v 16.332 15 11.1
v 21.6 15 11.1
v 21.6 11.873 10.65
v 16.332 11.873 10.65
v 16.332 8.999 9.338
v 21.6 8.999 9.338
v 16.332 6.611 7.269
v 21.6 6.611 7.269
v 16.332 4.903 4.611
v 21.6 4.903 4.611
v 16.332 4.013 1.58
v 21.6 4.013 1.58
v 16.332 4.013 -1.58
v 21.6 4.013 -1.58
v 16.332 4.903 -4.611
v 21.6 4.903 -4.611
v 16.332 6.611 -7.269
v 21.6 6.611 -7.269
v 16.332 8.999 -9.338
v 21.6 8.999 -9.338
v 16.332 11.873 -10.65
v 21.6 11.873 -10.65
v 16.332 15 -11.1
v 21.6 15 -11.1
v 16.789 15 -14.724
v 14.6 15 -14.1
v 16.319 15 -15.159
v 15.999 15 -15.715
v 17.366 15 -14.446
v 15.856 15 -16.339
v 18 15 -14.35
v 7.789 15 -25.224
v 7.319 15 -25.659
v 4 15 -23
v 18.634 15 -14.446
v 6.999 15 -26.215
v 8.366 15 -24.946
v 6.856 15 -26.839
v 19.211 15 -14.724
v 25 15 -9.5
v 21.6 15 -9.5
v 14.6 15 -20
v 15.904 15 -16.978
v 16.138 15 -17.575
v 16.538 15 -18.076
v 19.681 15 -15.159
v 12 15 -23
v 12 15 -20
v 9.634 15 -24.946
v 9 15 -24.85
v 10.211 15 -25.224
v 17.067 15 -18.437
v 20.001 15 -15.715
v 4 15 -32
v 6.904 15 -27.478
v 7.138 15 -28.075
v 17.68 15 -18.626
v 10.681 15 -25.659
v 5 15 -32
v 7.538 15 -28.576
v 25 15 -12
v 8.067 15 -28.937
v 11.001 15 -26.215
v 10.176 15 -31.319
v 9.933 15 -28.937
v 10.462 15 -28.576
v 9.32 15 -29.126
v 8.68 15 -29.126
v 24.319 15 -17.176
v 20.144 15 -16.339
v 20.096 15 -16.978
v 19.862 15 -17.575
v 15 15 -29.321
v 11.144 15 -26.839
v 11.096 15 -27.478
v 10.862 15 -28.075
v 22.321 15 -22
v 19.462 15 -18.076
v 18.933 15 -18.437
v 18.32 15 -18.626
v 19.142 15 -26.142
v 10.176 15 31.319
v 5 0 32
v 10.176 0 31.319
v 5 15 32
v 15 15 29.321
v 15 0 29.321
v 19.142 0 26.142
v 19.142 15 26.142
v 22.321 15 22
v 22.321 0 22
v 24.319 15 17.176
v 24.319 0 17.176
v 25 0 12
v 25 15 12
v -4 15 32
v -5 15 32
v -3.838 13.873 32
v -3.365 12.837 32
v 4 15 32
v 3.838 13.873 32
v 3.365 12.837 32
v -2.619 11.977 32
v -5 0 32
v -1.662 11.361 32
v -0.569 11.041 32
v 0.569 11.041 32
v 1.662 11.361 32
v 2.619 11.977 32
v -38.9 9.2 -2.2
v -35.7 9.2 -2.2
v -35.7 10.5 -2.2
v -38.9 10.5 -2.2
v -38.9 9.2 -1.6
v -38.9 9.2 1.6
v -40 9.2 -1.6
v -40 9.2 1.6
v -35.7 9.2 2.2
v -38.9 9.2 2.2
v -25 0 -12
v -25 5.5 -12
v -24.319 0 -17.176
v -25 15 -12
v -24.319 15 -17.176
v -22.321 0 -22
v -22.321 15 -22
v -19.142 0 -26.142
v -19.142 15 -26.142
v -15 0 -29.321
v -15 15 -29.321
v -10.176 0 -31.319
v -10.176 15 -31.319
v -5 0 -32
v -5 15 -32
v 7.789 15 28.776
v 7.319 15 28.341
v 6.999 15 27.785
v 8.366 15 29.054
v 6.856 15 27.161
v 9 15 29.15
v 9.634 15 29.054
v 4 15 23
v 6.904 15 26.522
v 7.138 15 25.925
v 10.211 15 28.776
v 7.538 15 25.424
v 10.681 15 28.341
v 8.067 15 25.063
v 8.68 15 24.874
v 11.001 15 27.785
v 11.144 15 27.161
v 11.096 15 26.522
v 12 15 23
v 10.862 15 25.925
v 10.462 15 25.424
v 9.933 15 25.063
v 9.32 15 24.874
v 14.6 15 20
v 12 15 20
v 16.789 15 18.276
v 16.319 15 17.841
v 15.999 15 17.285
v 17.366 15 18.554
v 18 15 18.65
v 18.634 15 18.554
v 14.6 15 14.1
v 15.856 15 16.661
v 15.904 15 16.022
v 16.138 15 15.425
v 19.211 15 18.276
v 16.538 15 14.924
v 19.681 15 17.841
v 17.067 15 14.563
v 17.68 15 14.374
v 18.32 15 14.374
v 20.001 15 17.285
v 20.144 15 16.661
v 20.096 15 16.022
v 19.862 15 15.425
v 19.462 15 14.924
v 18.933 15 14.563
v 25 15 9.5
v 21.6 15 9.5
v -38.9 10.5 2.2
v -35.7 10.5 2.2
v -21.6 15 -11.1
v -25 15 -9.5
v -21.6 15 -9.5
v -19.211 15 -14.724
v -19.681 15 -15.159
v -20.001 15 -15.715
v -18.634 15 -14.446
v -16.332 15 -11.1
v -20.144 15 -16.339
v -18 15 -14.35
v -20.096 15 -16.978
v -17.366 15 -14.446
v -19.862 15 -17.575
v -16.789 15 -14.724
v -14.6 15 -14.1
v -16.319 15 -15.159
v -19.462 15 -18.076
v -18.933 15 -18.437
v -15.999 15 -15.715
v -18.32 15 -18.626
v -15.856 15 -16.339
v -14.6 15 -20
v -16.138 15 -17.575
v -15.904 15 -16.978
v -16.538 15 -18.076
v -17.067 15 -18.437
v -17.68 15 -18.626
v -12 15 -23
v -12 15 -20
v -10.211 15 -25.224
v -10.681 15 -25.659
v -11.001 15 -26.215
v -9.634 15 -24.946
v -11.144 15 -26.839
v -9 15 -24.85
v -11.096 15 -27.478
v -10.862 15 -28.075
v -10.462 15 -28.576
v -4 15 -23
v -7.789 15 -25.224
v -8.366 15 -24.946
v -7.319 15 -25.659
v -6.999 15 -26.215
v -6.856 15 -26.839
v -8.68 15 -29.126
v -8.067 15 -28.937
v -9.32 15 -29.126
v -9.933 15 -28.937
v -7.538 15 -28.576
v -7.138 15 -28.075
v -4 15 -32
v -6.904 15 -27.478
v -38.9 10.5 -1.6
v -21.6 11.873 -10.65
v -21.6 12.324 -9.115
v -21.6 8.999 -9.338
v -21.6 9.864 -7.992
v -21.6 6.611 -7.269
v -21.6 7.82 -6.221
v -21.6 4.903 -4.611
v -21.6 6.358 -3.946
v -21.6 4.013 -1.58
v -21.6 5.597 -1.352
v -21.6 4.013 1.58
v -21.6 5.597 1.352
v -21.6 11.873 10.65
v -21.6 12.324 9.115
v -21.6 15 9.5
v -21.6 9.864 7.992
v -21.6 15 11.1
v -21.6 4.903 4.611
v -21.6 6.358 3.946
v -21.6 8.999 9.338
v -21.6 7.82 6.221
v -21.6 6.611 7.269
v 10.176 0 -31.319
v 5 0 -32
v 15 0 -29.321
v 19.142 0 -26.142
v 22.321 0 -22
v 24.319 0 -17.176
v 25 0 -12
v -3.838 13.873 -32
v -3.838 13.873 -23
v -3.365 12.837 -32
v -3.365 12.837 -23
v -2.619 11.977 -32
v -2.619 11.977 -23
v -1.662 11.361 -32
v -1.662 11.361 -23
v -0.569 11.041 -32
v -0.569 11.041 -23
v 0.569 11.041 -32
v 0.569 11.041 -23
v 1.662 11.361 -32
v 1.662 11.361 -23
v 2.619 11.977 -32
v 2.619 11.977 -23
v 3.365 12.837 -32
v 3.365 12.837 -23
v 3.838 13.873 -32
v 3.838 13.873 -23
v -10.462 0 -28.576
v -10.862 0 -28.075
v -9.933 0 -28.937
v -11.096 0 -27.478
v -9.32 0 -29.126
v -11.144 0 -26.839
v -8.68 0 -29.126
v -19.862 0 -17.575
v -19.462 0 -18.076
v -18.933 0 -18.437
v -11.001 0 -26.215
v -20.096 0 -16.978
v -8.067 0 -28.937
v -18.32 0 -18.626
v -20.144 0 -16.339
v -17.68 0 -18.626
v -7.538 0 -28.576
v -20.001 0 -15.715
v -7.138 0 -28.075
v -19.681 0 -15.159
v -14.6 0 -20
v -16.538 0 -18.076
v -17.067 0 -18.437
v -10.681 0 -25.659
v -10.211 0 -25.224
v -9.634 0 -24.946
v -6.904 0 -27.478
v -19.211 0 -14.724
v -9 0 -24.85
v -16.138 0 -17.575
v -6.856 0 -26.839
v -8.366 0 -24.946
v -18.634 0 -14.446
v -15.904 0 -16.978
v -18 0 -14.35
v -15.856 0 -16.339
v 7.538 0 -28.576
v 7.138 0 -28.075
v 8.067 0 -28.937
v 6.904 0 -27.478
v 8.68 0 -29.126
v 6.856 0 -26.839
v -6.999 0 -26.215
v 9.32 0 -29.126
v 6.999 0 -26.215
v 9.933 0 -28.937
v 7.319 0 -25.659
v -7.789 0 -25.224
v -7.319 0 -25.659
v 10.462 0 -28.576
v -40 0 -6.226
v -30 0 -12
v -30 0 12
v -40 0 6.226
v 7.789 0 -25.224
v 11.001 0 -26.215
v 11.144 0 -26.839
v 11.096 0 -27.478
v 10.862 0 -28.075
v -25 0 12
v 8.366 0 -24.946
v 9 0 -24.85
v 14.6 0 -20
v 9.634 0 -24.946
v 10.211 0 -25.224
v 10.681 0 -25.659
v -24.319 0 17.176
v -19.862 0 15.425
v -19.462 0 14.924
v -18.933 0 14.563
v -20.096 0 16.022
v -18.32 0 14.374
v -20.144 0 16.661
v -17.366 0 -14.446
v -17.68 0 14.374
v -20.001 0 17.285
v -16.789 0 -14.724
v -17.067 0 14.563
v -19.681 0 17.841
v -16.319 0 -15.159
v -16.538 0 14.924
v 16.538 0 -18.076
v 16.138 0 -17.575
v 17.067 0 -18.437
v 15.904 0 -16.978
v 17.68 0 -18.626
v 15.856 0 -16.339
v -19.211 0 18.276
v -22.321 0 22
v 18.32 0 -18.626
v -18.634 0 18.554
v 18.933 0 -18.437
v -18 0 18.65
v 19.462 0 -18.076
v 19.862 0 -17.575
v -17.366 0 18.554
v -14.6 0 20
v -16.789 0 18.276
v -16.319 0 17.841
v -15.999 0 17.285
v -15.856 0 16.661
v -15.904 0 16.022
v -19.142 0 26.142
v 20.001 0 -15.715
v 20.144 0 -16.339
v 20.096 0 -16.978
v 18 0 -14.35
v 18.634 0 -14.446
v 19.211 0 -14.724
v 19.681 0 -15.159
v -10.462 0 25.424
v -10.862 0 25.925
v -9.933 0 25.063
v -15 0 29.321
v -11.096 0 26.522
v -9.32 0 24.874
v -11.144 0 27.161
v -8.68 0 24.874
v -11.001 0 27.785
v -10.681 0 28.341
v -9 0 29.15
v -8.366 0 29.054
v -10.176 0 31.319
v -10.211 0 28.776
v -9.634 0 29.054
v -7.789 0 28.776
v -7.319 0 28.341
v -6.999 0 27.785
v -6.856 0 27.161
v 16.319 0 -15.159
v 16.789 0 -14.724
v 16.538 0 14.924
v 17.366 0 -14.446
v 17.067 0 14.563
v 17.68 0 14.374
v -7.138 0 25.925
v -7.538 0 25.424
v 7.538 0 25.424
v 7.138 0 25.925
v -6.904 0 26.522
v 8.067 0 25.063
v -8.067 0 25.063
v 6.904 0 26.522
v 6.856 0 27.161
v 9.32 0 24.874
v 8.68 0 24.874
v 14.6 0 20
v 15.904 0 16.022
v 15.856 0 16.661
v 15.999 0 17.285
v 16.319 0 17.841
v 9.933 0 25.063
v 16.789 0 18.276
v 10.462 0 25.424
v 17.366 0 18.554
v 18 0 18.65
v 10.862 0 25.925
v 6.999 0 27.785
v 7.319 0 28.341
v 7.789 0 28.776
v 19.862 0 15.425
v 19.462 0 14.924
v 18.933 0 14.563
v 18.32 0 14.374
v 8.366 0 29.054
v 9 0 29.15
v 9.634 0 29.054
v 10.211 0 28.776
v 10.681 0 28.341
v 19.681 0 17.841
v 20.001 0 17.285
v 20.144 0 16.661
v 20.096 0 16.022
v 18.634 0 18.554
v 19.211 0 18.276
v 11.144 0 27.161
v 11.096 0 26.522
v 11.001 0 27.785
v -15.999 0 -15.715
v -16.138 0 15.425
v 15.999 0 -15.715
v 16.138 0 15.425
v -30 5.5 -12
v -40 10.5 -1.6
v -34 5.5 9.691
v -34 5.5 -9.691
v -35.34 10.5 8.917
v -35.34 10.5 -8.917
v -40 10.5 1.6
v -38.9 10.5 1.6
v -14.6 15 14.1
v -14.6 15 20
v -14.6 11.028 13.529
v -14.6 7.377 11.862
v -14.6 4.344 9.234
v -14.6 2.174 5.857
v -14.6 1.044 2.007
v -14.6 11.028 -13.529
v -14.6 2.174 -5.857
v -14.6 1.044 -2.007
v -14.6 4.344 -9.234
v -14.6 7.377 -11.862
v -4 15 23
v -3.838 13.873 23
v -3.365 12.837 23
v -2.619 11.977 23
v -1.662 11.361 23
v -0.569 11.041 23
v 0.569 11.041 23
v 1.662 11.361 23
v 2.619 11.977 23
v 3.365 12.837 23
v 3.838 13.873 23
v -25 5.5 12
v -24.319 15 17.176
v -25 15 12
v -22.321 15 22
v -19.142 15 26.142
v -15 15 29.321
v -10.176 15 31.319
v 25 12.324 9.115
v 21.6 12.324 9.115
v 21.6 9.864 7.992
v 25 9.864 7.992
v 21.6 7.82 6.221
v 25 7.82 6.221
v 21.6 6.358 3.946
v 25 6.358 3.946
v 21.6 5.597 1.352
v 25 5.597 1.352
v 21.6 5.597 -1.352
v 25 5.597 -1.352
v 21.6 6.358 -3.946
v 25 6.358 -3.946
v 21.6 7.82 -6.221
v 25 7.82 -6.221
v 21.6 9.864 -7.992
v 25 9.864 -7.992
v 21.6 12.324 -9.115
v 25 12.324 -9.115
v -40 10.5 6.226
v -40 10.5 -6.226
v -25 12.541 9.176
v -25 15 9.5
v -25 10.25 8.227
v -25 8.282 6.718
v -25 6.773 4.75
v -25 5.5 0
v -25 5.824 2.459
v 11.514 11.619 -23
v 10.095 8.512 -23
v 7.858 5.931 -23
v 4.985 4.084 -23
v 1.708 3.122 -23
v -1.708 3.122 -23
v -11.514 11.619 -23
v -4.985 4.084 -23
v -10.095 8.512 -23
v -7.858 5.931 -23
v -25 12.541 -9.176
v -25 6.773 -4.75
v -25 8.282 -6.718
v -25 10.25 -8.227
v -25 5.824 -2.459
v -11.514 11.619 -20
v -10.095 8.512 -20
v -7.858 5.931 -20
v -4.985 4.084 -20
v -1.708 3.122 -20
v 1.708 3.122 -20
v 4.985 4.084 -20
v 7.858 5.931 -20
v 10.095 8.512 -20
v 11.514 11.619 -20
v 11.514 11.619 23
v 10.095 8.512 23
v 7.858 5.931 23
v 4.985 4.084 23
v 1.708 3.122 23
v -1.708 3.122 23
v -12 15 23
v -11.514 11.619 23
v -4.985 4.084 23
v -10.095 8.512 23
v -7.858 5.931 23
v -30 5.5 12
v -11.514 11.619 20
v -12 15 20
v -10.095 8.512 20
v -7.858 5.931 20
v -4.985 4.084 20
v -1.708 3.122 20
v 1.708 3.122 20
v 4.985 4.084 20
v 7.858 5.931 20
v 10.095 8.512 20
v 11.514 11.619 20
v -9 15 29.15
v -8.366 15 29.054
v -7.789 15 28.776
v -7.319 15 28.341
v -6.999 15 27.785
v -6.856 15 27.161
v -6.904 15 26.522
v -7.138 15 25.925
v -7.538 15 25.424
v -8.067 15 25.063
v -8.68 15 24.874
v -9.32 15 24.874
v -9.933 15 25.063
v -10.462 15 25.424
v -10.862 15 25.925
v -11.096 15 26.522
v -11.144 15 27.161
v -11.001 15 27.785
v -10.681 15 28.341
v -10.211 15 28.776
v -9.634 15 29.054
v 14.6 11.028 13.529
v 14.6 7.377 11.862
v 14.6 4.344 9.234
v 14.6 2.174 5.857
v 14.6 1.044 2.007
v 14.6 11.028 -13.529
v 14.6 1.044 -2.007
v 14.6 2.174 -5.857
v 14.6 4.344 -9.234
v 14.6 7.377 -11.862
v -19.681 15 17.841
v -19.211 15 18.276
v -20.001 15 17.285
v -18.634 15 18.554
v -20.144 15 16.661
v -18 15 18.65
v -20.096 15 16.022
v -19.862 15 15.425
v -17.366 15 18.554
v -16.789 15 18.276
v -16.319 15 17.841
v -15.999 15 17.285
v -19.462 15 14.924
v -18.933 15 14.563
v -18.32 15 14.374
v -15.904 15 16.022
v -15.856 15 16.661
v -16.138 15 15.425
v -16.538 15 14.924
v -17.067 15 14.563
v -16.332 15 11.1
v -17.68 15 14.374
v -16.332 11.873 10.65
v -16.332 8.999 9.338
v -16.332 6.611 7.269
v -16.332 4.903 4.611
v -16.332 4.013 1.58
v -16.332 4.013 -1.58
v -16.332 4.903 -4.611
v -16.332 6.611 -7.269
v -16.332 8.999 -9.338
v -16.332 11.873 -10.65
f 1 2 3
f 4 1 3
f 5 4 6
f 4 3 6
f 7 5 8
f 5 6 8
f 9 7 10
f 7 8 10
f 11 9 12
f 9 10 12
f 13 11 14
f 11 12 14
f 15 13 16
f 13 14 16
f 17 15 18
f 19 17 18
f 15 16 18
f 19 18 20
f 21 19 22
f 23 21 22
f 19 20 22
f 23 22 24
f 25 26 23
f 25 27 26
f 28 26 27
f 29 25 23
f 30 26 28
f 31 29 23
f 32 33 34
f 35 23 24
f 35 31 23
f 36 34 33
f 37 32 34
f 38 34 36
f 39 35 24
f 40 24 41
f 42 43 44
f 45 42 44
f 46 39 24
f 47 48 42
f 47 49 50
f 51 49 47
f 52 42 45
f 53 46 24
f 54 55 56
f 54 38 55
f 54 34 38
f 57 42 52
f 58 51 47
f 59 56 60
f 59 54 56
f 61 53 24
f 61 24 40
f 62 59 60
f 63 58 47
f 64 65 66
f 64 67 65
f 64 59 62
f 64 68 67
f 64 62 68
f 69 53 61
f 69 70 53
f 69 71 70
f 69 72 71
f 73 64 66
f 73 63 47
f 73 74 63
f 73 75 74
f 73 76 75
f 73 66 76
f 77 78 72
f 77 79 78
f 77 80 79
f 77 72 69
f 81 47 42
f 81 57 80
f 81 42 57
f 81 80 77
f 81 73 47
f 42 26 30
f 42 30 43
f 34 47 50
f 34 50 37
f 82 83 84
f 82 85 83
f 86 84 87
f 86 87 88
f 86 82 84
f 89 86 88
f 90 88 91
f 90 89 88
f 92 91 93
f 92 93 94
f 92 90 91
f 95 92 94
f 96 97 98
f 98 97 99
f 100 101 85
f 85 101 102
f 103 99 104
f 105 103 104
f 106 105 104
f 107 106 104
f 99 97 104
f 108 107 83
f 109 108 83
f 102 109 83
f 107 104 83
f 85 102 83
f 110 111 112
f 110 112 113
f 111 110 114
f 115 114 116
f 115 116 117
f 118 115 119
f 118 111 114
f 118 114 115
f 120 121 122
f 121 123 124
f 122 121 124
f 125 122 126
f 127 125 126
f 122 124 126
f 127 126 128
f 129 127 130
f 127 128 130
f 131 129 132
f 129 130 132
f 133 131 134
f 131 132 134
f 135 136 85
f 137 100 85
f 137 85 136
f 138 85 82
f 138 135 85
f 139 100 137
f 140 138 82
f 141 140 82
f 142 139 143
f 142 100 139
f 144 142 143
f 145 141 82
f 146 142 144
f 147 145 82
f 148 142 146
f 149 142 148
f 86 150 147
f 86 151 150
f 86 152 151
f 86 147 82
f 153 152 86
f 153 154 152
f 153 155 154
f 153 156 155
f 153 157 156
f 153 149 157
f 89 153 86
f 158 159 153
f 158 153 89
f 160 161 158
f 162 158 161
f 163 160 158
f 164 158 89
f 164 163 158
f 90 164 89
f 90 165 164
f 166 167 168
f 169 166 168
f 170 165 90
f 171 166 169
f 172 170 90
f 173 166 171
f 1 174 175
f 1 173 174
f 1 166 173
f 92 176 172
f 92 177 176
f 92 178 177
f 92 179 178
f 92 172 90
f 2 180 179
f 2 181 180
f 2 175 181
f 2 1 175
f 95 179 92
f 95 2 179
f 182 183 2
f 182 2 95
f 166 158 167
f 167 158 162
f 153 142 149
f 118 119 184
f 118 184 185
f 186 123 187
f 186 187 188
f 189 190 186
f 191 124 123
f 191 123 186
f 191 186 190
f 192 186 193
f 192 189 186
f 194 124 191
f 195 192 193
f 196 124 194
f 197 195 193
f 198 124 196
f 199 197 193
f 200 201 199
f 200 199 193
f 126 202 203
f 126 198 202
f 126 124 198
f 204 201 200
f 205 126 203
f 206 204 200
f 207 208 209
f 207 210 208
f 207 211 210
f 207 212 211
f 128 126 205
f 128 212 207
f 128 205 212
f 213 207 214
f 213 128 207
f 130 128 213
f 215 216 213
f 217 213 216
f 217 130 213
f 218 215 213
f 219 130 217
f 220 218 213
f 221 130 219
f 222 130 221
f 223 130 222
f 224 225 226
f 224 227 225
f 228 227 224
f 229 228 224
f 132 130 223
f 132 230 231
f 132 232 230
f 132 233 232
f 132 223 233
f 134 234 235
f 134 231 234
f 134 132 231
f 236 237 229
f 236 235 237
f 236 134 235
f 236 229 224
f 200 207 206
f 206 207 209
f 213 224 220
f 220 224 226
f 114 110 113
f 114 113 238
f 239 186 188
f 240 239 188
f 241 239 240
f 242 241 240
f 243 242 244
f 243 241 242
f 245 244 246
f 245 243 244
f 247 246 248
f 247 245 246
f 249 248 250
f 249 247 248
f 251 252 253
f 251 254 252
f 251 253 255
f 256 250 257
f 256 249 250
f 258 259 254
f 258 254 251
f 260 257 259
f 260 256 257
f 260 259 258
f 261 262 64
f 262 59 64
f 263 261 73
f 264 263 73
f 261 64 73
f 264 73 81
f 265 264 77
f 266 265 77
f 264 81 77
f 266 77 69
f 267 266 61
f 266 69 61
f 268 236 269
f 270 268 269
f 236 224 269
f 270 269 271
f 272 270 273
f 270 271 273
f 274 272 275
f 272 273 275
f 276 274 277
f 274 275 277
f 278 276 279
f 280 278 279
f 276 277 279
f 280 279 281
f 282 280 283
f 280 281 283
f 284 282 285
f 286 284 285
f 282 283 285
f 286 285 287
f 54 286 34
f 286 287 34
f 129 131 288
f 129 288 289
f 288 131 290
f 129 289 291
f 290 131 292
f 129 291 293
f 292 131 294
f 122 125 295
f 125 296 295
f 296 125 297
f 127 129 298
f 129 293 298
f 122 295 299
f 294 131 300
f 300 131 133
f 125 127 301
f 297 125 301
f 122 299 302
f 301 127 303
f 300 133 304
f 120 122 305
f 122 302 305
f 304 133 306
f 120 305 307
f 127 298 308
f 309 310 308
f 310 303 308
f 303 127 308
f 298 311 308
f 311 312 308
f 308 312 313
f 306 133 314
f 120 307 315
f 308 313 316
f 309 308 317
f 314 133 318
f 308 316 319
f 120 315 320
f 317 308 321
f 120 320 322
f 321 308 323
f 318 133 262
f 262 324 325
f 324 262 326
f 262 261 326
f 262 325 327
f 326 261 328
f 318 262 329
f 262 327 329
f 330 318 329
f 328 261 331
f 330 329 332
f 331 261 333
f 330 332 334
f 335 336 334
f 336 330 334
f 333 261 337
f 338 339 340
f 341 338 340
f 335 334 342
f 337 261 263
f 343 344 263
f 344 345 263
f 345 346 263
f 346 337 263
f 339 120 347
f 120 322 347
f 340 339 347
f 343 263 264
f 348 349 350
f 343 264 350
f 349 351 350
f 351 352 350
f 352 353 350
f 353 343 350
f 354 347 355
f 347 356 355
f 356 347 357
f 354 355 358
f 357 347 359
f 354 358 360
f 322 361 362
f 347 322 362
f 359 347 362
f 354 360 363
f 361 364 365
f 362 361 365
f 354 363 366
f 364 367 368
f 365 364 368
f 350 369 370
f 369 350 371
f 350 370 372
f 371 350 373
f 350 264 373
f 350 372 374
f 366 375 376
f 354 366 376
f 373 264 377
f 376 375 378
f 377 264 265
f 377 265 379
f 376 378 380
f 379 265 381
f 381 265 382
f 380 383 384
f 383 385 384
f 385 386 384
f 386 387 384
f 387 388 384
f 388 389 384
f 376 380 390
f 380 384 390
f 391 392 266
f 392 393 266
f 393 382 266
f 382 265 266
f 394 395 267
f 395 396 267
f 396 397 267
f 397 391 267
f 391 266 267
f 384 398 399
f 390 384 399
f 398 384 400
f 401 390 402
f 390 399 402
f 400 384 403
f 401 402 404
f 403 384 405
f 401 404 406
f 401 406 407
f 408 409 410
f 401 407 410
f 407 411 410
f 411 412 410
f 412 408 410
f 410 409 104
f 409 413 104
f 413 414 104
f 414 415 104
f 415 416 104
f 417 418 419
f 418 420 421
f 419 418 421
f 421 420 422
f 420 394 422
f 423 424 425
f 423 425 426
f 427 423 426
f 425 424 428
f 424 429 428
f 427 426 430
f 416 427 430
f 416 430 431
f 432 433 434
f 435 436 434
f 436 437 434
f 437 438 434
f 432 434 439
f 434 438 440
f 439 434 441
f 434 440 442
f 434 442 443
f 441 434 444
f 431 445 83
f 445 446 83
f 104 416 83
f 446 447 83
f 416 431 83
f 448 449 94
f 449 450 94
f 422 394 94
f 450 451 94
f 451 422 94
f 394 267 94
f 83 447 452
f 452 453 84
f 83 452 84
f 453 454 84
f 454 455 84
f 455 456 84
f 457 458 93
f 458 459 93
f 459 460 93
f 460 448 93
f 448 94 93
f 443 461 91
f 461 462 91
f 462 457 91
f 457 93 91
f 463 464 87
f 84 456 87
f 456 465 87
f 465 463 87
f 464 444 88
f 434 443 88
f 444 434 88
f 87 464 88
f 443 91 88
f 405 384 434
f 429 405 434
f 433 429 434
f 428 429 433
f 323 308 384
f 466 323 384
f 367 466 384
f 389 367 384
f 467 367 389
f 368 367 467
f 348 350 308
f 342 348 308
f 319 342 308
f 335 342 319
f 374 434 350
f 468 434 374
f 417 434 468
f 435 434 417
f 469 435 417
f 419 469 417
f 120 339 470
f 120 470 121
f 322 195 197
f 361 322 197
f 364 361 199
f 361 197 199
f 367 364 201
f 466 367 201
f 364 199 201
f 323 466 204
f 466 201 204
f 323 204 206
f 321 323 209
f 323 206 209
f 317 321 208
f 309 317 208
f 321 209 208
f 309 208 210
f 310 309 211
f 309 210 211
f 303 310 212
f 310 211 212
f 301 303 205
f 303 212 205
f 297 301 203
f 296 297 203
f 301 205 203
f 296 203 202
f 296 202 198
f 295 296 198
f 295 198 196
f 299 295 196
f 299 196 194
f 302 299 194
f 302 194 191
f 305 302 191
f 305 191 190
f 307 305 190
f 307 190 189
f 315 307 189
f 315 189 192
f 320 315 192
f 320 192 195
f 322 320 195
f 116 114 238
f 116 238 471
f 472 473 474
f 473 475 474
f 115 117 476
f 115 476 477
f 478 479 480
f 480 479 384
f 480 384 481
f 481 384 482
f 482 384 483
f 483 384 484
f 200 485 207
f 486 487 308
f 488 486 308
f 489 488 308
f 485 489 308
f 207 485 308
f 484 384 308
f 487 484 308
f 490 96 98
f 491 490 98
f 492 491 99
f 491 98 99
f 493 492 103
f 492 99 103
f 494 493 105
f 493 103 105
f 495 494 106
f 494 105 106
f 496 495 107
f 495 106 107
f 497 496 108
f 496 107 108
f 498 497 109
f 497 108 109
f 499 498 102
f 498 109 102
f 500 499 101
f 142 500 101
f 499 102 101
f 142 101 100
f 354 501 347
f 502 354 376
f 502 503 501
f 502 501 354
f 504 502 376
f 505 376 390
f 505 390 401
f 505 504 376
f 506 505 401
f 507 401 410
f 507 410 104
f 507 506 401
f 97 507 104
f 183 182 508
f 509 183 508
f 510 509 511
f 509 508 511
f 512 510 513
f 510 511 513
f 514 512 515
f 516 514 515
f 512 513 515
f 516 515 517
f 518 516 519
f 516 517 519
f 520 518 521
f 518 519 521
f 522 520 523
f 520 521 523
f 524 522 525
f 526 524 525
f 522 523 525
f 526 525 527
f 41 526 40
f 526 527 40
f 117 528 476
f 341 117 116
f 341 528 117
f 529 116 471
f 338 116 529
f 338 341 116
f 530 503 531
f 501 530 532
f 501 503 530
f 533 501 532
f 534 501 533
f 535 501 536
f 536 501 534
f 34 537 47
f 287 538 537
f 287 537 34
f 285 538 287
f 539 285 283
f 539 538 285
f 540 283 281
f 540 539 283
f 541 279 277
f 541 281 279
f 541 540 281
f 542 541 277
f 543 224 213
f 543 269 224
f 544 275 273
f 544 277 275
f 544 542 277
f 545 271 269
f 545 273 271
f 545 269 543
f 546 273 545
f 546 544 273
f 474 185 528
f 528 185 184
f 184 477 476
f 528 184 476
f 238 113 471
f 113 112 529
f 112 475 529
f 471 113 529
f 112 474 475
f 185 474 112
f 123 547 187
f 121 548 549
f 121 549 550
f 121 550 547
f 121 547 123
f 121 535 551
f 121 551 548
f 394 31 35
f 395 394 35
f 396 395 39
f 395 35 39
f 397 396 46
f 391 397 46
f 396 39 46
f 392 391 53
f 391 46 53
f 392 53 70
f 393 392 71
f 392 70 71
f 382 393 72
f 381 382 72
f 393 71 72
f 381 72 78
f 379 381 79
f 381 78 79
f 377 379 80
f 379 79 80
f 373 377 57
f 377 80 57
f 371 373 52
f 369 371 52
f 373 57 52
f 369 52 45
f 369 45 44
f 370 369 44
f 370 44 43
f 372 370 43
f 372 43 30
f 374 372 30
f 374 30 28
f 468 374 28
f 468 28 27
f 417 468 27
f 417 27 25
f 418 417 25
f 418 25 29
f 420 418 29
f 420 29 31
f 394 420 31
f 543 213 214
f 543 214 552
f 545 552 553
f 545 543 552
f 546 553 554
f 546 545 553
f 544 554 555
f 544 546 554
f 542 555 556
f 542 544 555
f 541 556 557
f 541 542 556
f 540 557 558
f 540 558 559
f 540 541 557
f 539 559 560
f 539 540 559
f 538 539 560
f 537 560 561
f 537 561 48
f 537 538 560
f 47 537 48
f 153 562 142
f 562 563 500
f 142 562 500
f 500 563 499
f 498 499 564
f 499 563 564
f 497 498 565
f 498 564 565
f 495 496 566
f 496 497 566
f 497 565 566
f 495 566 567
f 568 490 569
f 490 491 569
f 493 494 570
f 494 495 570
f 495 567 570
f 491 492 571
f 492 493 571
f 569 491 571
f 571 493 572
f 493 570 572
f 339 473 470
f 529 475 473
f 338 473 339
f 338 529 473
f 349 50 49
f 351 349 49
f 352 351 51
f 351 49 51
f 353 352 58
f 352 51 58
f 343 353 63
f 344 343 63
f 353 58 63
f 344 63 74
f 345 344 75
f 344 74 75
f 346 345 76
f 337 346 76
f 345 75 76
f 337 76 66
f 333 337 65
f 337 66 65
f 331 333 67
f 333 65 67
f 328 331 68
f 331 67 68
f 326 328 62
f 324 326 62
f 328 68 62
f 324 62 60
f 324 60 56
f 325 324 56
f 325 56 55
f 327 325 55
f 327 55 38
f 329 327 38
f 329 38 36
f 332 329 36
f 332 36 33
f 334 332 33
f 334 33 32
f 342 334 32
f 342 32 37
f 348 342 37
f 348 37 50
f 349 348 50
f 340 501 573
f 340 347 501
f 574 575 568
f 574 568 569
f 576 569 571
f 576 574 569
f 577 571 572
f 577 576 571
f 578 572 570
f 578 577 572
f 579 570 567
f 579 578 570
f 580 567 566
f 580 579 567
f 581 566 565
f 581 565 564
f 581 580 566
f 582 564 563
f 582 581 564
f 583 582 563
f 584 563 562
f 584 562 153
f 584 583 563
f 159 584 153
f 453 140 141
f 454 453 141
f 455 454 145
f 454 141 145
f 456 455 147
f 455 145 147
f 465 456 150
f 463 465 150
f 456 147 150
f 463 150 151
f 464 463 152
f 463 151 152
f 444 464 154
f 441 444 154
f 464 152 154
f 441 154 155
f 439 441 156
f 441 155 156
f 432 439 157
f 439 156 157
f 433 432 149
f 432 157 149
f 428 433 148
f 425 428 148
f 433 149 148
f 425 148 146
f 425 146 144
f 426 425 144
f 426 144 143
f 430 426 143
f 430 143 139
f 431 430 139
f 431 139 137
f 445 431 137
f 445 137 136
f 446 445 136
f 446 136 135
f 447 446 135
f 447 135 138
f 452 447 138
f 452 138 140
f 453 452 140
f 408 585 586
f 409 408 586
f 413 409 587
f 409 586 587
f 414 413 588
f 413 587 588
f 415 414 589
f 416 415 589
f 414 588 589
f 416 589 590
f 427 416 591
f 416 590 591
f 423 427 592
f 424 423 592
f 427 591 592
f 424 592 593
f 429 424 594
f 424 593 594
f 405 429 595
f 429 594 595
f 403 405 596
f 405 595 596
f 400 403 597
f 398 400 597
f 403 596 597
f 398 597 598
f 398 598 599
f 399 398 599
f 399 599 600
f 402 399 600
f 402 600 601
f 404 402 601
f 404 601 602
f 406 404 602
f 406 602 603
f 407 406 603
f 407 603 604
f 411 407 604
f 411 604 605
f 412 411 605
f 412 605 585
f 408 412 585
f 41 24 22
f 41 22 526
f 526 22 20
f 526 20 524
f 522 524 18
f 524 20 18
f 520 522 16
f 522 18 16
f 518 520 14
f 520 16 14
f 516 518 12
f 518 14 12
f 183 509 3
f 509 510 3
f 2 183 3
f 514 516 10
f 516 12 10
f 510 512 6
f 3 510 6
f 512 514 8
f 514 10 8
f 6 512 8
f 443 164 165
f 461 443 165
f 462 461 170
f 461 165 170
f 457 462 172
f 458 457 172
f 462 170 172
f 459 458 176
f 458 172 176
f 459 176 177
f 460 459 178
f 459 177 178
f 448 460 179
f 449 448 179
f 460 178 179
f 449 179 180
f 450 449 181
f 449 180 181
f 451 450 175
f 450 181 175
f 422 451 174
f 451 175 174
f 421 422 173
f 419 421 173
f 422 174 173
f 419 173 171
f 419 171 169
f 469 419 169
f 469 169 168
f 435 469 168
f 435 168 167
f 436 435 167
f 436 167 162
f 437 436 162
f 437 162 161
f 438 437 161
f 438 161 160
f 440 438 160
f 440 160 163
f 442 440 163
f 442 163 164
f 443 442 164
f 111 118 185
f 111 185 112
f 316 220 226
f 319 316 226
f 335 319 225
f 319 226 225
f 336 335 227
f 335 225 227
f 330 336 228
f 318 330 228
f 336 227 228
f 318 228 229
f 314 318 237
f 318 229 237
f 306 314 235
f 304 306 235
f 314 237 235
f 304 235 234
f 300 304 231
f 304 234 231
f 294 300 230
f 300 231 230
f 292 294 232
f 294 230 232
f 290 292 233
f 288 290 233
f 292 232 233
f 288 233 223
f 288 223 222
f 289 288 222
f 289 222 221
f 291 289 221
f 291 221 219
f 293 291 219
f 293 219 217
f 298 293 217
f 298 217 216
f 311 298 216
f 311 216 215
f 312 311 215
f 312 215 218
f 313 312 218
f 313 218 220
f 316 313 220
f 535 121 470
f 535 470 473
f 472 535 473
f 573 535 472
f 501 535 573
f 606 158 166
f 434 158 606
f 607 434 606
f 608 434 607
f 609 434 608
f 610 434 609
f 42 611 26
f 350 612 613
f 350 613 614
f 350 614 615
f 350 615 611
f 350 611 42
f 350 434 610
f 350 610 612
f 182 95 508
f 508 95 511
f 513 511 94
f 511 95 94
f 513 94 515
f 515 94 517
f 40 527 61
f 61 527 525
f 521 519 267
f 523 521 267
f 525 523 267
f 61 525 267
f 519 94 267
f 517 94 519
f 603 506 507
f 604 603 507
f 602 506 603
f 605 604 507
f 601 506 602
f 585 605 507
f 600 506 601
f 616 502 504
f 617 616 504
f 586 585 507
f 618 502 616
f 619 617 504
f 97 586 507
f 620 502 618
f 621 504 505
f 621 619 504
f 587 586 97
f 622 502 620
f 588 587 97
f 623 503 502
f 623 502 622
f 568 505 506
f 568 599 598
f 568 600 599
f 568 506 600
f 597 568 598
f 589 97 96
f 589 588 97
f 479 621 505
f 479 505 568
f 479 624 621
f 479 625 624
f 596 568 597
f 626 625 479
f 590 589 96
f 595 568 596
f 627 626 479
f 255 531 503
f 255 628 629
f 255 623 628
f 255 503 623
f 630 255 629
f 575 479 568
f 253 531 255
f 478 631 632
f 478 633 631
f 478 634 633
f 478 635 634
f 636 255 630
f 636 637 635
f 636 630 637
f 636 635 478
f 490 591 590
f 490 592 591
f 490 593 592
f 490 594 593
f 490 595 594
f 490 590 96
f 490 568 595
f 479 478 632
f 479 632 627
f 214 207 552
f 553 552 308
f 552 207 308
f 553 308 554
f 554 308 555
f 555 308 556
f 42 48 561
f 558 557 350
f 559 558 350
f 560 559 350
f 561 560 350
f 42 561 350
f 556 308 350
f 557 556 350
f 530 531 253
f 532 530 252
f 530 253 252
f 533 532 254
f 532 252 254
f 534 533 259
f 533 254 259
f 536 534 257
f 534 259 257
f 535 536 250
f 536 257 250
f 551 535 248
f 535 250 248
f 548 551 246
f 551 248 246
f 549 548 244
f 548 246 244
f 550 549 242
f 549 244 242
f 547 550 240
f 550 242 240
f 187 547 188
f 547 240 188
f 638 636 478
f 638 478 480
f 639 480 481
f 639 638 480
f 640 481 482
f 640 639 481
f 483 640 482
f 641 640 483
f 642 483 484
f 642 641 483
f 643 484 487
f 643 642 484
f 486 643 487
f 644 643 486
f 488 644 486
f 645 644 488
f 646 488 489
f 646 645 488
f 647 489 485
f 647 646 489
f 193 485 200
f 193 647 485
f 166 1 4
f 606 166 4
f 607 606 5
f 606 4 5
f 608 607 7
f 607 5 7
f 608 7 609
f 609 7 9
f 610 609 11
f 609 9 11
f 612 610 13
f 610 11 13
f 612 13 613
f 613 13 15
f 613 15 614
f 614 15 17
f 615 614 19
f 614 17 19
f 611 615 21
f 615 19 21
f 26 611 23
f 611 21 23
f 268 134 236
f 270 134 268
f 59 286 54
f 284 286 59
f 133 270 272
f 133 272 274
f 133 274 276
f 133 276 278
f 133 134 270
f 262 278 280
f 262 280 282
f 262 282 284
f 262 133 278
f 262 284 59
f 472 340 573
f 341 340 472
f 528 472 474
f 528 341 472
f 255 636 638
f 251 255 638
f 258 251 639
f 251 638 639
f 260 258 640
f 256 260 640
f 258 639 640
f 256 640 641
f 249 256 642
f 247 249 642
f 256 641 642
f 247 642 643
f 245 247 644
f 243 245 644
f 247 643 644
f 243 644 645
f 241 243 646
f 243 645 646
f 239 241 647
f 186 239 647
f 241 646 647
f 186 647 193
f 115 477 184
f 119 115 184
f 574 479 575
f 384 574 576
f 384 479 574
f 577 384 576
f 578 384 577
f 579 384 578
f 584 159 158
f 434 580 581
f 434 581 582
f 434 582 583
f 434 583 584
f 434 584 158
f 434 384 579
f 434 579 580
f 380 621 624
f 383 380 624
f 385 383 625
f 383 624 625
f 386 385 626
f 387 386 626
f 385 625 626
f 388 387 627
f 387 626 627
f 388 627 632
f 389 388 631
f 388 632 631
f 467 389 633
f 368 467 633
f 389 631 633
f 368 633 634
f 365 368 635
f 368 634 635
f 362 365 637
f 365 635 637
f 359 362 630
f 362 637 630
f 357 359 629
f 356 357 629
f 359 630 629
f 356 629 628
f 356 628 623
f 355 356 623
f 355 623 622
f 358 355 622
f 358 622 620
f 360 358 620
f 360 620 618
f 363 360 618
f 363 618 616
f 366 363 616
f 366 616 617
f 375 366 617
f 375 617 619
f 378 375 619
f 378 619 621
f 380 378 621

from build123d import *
from OCP.BRepFilletAPI import BRepFilletAPI_MakeChamfer

# Parameters (mm, degrees)
SKETCH1_W           = 50
SKETCH1_H           = 64
SKETCH1_W_2         = 29.2
SKETCH1_H_2         = 40
BOSS_EXTRUDE1_DEPTH = 15
SKETCH3_W           = 7
SKETCH3_H           = 11.1
SKETCH4_R           = 9.5
CUT_EXTRUDE2_DEPTH  = 62.229078059
SKETCH5_R           = 4
CUT_EXTRUDE3_DEPTH  = 71.32780389
SKETCH8_R           = 2.15
CUT_EXTRUDE6_DEPTH  = 44.289721644
FILLET1_R           = 20
CHAMFER1_SIZE       = 3
CHAMFER1_SIZE2      = 1.732050808
SKETCH9_W           = 12
SKETCH9_H           = 3
SKETCH10_W          = 24
SKETCH10_H          = 5.5
BOSS_EXTRUDE2_DEPTH = 15
BOSS_EXTRUDE3_START = 9
SKETCH12_W          = 24
SKETCH12_H          = 3.7
BOSS_EXTRUDE3_DEPTH = 6
BOSS_EXTRUDE4_DEPTH = 1.3
CHAMFER2_SIZE2      = 1.339745962
CHAMFER2_SIZE       = 5
CHAMFER3_SIZE       = 10
CHAMFER3_SIZE2      = 5.773502692


with BuildPart() as part:
    # Sketch1 → Boss-Extrude1 (new body)
    with BuildSketch(Plane(origin=(0, 0, 0), x_dir=(1, 0, 0), z_dir=(0, 1, 0))):
        Rectangle(SKETCH1_W, SKETCH1_H)
        Rectangle(SKETCH1_W_2, SKETCH1_H_2, mode=Mode.SUBTRACT)
    extrude(amount=BOSS_EXTRUDE1_DEPTH)

    # Sketch3 → Cut-Revolve1 (revolve, cut)
    with BuildSketch(Plane(origin=(0, 15, 0), x_dir=(1, 0, 0), z_dir=(0, 1, 0))):
        with Locations((18.1, -5.55)):
            Rectangle(SKETCH3_W, SKETCH3_H)
        with Locations((-18.1, -5.55)):
            Rectangle(SKETCH3_W, SKETCH3_H)
    revolve(axis=Axis((14.6, 15, 0), (1, 0, 0)), mode=Mode.SUBTRACT)

    # Sketch4 → Cut-Extrude2 (cut, through all)
    with BuildSketch(Plane(origin=(25, 0, 0), x_dir=(0, 0, -1), z_dir=(1, 0, 0))):
        with Locations((0, 15)):
            Circle(SKETCH4_R)
    extrude(amount=-CUT_EXTRUDE2_DEPTH, mode=Mode.SUBTRACT)

    # Sketch5 → Cut-Extrude3 (cut, through all)
    with BuildSketch(Plane.XY.offset(32)):
        with Locations((0, 15)):
            Circle(SKETCH5_R)
    extrude(amount=-CUT_EXTRUDE3_DEPTH, mode=Mode.SUBTRACT)

    # Sketch8 → Cut-Extrude6 (cut, through all)
    with BuildSketch(Plane(origin=(0, 15, 0), x_dir=(1, 0, 0), z_dir=(0, 1, 0))):
        with Locations(Location((18, 16.5, 0), (0, 0, 270))):
            Circle(SKETCH8_R)
        with Locations(Location((18, -16.5, 0), (0, 0, 270))):
            Circle(SKETCH8_R)
        with Locations(Location((-18, -16.5, 0), (0, 0, 270))):
            Circle(SKETCH8_R)
        with Locations(Location((-18, 16.5, 0), (0, 0, 270))):
            Circle(SKETCH8_R)
        with Locations(Location((9, -27, 0), (0, 0, 270))):
            Circle(SKETCH8_R)
        with Locations(Location((-9, -27, 0), (0, 0, 270))):
            Circle(SKETCH8_R)
        with Locations(Location((-9, 27, 0), (0, 0, 270))):
            Circle(SKETCH8_R)
        with Locations(Location((9, 27, 0), (0, 0, 270))):
            Circle(SKETCH8_R)
    extrude(amount=-CUT_EXTRUDE6_DEPTH, mode=Mode.SUBTRACT)

    # Fillet1
    fillet1_edges = [part.edges().sort_by_distance(p)[0] for p in [
        (-25, 7.5, -32),
        (25, 7.5, -32),
        (25, 7.5, 32),
        (-25, 7.5, 32),
    ]]
    fillet(fillet1_edges, radius=FILLET1_R)

    # Chamfer1: one chamfer whose edges measure the first distance from different faces: ONE call of the kernel's chamfer builder (chamfer() names one face for all edges)
    chamfer1_edges_1 = [part.edges().sort_by_distance(p)[0] for p in [
        (14.6, 3.9, 0),
    ]]
    chamfer1_side_1 = [part.faces().sort_by_distance(p)[0] for p in [
        (14.6, 0.427200187, 0),
    ]]
    chamfer1_edges_2 = [part.edges().sort_by_distance(p)[0] for p in [
        (-14.6, 3.9, 0),
    ]]
    chamfer1_side_2 = [part.faces().sort_by_distance(p)[0] for p in [
        (-14.6, 0.427200187, 0),
    ]]
    chamfer1 = BRepFilletAPI_MakeChamfer(part.part.solid().wrapped)
    for e in chamfer1_edges_1:
        chamfer1.Add(CHAMFER1_SIZE, CHAMFER1_SIZE2, e.wrapped, chamfer1_side_1[0].wrapped)  # the first distance lies on this face
    for e in chamfer1_edges_2:
        chamfer1.Add(CHAMFER1_SIZE, CHAMFER1_SIZE2, e.wrapped, chamfer1_side_2[0].wrapped)  # the first distance lies on this face
    add(Compound.cast(chamfer1.Shape()), mode=Mode.REPLACE)

    # Sketch9 → Cut-Revolve2 (revolve, cut)
    with BuildSketch(Plane(origin=(0, 15, 0), x_dir=(1, 0, 0), z_dir=(0, 1, 0))):
        with Locations((-6, -21.5)):
            Rectangle(SKETCH9_W, SKETCH9_H)
        with Locations((-6, 21.5)):
            Rectangle(SKETCH9_W, SKETCH9_H)
    revolve(axis=Axis((0, 15, -29.871415895), (0, 0, 1)), mode=Mode.SUBTRACT)

    # Sketch10 → Boss-Extrude2 (add)
    with BuildSketch(Plane.ZY.offset(25)):
        with Locations((0, 2.75)):
            Rectangle(SKETCH10_W, SKETCH10_H)
    extrude(amount=BOSS_EXTRUDE2_DEPTH)

    # Sketch12 → Boss-Extrude3 (add)
    with BuildSketch(Plane.ZY.offset(25).offset(BOSS_EXTRUDE3_START)):
        with Locations((0, 7.35)):
            Rectangle(SKETCH12_W, SKETCH12_H)
    extrude(amount=BOSS_EXTRUDE3_DEPTH)

    # Sketch13 → Boss-Extrude4 (add)
    with BuildSketch(Plane(origin=(0, 9.2, 0), x_dir=(1, 0, 0), z_dir=(0, 1, 0))):
        Polygon((-38.9, 2.2), (-38.9, 1.6), (-40, 1.6), (-40, 12), (-34, 12), (-34, -12), (-40, -12), (-40, -1.6), (-38.9, -1.6), (-38.9, -2.2), (-35.7, -2.2), (-35.7, 2.2), align=None)
    extrude(amount=BOSS_EXTRUDE4_DEPTH)

    # Chamfer2
    chamfer2_edges = [part.edges().sort_by_distance(p)[0] for p in [
        (-34, 10.5, 0),
    ]]
    chamfer2_side = [part.faces().sort_by_distance(p)[0] for p in [
        (-34, 10.473205081, 0),
    ]]
    chamfer(chamfer2_edges, length=CHAMFER2_SIZE - 0.0001, length2=CHAMFER2_SIZE2 - 0.0001, reference=chamfer2_side[0])  # a hair under: the kernel refuses the full size

    # Chamfer3: one chamfer whose edges measure the first distance from different faces: ONE call of the kernel's chamfer builder (chamfer() names one face for all edges)
    chamfer3_edges_1 = [part.edges().sort_by_distance(p)[0] for p in [
        (-40, 5.25, 12),
    ]]
    chamfer3_side_1 = [part.faces().sort_by_distance(p)[0] for p in [
        (-33.677093858, 4.00630158, 12),
    ]]
    chamfer3_edges_2 = [part.edges().sort_by_distance(p)[0] for p in [
        (-40, 5.25, -12),
    ]]
    chamfer3_side_2 = [part.faces().sort_by_distance(p)[0] for p in [
        (-33.677093858, 4.00630158, -12),
    ]]
    chamfer3 = BRepFilletAPI_MakeChamfer(part.part.solid().wrapped)
    for e in chamfer3_edges_1:
        chamfer3.Add(CHAMFER3_SIZE, CHAMFER3_SIZE2, e.wrapped, chamfer3_side_1[0].wrapped)  # the first distance lies on this face
    for e in chamfer3_edges_2:
        chamfer3.Add(CHAMFER3_SIZE, CHAMFER3_SIZE2, e.wrapped, chamfer3_side_2[0].wrapped)  # the first distance lies on this face
    add(Compound.cast(chamfer3.Shape()), mode=Mode.REPLACE)


solid = part.part
